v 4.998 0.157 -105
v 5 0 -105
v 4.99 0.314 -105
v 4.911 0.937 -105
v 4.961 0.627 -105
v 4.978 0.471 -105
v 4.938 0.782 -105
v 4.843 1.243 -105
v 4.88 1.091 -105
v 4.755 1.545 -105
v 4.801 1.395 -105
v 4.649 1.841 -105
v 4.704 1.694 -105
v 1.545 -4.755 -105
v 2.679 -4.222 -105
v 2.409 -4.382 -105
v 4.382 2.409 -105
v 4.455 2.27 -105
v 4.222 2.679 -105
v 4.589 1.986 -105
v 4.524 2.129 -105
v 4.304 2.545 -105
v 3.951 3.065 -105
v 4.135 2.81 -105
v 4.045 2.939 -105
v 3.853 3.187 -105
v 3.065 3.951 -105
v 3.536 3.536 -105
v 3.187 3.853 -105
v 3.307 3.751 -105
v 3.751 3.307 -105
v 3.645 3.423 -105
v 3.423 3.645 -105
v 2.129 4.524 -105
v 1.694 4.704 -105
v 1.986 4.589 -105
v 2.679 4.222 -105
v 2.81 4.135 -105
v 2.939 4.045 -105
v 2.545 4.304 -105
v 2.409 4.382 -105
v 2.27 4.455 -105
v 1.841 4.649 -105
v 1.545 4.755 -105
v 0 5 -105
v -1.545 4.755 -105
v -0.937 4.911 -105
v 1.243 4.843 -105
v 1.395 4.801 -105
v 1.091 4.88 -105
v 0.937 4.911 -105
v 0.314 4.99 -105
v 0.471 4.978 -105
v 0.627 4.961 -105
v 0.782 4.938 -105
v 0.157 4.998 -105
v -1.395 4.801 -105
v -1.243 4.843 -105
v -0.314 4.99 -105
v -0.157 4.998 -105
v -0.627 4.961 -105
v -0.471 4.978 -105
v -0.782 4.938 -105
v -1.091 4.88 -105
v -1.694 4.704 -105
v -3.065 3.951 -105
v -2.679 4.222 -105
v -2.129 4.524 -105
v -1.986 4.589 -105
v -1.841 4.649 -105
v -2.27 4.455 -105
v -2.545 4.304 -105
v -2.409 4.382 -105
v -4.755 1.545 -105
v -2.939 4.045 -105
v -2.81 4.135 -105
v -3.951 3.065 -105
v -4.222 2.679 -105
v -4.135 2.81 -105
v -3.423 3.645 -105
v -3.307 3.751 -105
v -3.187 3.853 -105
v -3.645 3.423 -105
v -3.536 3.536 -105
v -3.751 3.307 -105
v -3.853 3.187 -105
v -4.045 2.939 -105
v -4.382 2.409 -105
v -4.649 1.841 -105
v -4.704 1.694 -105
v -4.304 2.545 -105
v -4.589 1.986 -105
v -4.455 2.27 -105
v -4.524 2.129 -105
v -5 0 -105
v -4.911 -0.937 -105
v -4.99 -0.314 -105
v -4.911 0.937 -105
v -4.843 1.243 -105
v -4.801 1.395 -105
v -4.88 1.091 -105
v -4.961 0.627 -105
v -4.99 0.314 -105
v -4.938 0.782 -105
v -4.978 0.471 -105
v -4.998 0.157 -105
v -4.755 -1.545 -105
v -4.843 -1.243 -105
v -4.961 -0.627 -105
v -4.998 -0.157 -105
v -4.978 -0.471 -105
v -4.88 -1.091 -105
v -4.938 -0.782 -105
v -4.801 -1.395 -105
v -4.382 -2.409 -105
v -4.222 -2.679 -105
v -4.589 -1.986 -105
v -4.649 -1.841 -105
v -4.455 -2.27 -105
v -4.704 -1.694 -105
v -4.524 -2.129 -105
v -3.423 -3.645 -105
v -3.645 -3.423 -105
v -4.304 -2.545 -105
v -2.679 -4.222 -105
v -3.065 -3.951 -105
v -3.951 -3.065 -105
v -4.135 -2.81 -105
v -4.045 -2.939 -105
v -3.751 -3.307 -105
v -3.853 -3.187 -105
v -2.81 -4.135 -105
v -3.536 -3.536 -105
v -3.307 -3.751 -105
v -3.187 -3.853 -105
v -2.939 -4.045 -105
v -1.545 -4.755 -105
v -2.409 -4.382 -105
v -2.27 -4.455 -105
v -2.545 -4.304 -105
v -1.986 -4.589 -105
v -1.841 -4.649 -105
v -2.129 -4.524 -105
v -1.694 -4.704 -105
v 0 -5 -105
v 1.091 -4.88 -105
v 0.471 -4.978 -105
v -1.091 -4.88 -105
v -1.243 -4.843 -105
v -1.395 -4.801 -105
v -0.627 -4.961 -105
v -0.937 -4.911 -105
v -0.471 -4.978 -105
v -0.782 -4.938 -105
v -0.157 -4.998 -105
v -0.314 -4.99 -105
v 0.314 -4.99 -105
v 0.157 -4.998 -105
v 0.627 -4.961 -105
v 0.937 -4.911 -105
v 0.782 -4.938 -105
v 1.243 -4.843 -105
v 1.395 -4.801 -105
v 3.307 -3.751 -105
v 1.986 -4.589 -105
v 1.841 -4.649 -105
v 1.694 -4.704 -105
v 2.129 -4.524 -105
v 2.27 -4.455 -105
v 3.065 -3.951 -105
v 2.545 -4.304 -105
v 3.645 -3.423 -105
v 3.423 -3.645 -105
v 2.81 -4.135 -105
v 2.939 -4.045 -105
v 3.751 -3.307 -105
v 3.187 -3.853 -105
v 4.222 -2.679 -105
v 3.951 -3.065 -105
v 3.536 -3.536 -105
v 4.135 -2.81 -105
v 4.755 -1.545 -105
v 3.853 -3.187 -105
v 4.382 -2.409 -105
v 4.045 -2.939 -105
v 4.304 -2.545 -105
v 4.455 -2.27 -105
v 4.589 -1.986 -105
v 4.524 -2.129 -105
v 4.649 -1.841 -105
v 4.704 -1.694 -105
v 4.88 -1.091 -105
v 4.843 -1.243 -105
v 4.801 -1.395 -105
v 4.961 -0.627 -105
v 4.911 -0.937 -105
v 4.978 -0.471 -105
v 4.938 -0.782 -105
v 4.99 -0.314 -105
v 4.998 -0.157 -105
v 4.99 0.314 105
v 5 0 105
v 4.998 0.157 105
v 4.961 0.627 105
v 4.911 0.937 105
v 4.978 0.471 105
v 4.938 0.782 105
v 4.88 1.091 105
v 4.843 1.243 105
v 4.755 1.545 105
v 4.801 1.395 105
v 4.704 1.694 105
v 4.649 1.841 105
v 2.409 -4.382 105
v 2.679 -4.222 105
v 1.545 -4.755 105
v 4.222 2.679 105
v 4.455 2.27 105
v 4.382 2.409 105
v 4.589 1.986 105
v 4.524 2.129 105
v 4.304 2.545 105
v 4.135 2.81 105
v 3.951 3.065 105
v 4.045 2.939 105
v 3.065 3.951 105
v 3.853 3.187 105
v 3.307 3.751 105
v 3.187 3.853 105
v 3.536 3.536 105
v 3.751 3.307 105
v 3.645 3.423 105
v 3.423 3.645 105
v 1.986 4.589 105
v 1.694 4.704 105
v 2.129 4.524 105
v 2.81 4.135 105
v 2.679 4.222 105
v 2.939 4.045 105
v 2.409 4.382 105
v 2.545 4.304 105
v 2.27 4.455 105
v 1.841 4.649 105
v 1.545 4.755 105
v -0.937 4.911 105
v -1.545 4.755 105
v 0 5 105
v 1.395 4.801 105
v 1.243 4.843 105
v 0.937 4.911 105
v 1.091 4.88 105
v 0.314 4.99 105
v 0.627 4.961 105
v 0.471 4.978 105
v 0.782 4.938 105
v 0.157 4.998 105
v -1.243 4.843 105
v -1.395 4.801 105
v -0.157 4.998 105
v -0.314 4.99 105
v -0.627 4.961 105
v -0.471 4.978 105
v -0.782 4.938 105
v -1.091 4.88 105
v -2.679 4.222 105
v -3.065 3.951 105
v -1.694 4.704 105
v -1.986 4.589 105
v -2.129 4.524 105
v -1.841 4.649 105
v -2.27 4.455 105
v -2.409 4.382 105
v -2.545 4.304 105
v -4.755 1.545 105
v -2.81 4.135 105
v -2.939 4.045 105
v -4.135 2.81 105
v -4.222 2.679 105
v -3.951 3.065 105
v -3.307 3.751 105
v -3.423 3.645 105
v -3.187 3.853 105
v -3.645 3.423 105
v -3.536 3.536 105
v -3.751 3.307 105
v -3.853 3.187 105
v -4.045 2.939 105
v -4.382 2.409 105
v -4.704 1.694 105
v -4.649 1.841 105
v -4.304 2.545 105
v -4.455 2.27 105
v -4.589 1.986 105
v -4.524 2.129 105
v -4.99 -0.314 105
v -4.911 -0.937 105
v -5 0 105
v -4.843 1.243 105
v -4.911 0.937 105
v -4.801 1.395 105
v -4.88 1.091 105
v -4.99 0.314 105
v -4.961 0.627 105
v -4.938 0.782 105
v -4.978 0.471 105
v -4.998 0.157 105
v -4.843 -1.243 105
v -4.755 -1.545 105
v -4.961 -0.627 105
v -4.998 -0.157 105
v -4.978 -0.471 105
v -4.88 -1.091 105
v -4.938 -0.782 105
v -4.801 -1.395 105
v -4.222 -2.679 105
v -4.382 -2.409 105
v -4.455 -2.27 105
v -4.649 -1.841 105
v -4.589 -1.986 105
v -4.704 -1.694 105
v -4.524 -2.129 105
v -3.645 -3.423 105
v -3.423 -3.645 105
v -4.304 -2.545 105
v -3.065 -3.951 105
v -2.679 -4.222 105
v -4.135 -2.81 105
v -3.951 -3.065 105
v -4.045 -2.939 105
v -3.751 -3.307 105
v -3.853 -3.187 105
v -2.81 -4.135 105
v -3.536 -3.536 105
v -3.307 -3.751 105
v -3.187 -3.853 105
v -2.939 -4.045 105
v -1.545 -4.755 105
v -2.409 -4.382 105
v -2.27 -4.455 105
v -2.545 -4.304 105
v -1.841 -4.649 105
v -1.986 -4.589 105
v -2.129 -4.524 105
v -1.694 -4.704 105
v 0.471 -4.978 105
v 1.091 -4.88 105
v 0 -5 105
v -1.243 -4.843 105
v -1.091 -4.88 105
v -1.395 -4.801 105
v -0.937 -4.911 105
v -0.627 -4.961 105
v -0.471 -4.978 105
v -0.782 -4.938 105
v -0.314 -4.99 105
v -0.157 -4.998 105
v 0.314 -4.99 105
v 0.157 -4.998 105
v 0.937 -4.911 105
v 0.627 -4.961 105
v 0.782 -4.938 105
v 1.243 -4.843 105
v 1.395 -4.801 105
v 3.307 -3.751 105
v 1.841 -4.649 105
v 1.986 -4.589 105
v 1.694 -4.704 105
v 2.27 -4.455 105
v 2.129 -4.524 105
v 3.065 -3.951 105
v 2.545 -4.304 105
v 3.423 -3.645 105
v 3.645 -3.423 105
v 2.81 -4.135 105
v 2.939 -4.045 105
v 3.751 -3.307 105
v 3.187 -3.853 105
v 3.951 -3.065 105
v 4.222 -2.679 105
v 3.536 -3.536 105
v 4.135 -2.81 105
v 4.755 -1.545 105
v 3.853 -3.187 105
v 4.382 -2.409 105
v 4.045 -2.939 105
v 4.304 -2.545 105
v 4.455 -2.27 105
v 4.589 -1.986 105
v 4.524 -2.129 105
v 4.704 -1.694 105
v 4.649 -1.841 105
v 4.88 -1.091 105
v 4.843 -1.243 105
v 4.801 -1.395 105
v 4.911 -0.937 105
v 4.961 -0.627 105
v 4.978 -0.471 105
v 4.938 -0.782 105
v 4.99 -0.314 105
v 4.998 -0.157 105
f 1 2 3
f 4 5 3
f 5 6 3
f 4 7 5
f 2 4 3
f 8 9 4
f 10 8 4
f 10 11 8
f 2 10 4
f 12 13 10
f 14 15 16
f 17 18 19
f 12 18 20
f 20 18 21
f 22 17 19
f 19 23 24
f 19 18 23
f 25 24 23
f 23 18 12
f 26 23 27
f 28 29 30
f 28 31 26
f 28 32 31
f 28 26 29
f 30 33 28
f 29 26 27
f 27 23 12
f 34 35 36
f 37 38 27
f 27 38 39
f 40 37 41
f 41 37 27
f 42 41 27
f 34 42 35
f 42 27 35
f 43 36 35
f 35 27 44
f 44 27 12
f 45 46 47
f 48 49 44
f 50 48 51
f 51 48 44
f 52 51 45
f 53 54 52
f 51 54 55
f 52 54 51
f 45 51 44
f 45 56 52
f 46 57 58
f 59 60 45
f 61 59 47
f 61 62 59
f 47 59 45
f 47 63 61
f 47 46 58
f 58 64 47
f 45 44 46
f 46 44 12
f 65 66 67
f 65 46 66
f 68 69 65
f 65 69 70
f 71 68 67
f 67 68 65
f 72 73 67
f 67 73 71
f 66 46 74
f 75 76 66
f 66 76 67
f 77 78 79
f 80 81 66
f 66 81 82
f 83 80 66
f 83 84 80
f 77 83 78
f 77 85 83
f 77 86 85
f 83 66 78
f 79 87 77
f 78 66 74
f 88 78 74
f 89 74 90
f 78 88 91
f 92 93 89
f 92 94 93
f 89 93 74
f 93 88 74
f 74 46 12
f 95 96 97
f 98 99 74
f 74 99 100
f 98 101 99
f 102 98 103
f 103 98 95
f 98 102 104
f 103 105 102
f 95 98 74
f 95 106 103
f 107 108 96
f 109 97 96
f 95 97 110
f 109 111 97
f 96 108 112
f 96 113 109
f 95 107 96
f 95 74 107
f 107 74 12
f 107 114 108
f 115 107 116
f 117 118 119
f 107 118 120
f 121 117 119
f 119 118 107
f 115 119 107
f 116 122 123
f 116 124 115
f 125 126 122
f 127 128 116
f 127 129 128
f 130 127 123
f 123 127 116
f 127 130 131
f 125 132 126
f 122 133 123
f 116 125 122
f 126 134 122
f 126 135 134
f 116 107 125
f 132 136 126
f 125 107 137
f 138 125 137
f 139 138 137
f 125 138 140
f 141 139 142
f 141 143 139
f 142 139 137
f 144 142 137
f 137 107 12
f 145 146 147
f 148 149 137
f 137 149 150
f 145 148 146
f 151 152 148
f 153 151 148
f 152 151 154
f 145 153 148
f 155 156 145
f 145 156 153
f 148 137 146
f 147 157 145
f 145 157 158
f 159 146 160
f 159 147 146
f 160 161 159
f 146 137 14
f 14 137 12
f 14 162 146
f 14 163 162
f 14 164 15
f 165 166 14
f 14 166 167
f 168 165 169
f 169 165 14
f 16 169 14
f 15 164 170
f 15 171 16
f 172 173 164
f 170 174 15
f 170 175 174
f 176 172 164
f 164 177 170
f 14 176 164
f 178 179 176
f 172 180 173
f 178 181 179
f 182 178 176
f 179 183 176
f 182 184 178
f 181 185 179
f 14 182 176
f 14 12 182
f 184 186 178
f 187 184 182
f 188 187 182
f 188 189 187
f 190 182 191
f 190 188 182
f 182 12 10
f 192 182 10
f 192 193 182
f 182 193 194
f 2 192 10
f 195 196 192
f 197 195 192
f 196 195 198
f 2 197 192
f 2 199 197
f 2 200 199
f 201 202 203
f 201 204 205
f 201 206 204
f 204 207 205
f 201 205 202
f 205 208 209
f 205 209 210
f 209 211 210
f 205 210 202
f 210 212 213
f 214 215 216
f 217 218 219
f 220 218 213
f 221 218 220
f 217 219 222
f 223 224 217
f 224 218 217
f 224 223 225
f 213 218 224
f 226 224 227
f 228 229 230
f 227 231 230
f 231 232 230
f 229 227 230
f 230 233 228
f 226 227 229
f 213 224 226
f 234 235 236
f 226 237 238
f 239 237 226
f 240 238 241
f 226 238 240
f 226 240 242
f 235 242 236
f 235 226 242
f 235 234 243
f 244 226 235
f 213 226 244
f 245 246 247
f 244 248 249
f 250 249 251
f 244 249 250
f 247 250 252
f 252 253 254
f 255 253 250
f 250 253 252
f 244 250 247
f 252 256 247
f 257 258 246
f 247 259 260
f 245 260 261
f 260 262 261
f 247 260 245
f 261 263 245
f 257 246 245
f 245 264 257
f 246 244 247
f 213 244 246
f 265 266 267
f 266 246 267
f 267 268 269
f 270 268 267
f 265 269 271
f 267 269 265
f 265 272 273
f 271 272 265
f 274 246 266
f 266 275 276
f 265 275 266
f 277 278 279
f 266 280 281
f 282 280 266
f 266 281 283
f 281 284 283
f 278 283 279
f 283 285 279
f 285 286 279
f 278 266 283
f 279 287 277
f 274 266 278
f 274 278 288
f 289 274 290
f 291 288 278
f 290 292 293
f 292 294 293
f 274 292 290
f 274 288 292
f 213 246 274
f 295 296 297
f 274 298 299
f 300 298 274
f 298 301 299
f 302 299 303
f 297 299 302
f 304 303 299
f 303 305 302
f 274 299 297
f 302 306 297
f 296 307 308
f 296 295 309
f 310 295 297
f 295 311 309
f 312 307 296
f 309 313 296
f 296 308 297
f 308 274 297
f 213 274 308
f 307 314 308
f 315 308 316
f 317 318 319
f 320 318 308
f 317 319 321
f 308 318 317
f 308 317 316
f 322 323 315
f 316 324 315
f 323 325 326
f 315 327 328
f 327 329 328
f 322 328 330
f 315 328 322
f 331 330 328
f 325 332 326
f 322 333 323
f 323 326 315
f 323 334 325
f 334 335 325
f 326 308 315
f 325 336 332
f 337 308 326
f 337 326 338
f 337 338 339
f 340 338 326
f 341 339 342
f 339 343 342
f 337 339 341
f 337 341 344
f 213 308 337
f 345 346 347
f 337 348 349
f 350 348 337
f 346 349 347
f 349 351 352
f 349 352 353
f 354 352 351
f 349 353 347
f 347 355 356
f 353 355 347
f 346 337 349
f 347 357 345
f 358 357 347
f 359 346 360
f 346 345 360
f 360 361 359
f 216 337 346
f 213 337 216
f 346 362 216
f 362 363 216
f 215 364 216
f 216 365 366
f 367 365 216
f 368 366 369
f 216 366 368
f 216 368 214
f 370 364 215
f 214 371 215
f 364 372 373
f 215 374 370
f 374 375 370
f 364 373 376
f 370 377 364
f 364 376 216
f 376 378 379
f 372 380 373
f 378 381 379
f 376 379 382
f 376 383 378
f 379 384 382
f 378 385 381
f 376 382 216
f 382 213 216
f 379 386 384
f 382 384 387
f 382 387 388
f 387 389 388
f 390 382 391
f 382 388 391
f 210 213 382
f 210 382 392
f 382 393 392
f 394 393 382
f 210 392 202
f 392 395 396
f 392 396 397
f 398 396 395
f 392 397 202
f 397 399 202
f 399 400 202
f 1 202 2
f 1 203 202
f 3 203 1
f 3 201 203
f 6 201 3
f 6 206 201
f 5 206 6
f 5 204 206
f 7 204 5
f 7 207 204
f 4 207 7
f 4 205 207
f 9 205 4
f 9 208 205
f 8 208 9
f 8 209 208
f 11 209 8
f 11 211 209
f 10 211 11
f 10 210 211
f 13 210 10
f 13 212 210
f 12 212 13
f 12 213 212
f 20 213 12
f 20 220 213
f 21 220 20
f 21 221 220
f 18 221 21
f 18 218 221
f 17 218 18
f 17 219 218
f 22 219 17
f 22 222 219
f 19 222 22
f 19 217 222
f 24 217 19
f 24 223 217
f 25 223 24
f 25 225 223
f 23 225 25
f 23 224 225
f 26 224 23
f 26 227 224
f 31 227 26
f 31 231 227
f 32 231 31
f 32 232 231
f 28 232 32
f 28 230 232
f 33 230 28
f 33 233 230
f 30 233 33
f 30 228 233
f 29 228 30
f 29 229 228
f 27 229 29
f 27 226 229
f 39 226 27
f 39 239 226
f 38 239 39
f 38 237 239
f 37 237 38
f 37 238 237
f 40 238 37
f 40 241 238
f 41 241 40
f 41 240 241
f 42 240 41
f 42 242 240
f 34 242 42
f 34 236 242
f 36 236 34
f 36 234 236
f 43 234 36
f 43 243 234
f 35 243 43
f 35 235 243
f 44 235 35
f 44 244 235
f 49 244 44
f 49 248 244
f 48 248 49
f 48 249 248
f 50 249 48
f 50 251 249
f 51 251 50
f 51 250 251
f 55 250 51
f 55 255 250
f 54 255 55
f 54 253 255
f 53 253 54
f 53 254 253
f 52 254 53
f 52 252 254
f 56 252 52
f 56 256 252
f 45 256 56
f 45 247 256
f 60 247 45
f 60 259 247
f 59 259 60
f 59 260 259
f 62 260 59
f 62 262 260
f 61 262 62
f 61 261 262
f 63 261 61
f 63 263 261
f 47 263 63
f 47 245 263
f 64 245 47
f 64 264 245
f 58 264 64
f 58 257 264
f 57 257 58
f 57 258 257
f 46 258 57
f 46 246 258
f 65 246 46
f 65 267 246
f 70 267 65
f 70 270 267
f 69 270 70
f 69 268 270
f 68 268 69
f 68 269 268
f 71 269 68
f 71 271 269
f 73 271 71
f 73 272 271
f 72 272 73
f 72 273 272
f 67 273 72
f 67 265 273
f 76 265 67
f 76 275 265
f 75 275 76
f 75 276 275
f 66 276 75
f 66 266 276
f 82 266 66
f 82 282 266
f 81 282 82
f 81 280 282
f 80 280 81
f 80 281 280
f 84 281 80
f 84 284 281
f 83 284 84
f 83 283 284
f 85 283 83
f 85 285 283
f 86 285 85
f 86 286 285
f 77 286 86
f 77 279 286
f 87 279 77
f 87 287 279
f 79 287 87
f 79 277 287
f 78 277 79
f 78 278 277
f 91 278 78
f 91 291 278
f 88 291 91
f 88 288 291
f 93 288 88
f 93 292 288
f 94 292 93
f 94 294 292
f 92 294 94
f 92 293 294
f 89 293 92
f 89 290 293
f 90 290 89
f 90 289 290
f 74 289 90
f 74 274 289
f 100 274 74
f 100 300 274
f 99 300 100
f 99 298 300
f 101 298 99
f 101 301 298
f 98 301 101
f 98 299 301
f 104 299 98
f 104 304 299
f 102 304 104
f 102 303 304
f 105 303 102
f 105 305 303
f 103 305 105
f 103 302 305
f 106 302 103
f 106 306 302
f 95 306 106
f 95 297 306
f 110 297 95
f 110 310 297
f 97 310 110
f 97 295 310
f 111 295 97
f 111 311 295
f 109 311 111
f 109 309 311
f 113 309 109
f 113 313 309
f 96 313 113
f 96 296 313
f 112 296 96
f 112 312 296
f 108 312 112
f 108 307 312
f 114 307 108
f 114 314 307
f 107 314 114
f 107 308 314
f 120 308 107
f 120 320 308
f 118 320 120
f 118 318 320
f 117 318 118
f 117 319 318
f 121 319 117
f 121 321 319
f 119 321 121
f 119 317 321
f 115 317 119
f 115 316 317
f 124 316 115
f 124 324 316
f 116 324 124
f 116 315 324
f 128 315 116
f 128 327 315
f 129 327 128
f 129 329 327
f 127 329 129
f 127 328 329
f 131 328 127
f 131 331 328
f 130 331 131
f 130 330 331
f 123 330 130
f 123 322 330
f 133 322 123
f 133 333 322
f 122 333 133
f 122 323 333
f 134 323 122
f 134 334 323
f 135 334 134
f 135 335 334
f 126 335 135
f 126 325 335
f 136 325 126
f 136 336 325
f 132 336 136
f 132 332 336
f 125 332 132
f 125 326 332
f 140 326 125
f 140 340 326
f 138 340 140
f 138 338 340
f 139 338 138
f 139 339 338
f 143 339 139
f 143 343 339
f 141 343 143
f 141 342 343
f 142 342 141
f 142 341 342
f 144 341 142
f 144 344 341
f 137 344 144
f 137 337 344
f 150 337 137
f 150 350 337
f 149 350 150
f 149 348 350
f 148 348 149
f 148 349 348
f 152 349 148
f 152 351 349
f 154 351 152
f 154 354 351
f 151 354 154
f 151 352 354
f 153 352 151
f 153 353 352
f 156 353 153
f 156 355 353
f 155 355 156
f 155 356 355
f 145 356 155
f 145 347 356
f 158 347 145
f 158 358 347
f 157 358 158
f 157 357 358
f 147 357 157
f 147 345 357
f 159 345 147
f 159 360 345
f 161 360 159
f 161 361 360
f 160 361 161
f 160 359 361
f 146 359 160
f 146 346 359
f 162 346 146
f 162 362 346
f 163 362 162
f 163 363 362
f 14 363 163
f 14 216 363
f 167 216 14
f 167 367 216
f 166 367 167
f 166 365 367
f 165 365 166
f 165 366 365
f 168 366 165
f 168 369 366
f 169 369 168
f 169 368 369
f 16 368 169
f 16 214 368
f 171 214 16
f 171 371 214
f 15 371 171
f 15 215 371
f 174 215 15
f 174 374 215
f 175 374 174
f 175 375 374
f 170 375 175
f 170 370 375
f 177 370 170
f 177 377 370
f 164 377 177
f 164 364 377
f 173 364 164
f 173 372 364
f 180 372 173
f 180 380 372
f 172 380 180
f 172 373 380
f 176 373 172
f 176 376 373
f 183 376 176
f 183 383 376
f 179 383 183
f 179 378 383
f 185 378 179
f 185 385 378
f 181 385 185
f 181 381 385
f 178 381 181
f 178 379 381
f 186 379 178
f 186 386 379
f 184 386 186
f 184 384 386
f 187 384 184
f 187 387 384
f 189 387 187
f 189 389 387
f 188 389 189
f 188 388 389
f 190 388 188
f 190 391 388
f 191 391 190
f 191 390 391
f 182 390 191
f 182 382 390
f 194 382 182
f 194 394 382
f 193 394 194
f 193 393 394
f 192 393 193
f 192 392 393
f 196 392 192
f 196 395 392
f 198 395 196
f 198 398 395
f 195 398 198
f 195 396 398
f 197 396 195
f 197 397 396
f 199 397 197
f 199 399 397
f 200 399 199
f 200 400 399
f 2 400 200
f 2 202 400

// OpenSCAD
a5Length=210;
a5Width=148;

spineHeight=5;

linear_extrude(height = a5Length, center = true) {
    circle(spineHeight, $fn=200);
}
